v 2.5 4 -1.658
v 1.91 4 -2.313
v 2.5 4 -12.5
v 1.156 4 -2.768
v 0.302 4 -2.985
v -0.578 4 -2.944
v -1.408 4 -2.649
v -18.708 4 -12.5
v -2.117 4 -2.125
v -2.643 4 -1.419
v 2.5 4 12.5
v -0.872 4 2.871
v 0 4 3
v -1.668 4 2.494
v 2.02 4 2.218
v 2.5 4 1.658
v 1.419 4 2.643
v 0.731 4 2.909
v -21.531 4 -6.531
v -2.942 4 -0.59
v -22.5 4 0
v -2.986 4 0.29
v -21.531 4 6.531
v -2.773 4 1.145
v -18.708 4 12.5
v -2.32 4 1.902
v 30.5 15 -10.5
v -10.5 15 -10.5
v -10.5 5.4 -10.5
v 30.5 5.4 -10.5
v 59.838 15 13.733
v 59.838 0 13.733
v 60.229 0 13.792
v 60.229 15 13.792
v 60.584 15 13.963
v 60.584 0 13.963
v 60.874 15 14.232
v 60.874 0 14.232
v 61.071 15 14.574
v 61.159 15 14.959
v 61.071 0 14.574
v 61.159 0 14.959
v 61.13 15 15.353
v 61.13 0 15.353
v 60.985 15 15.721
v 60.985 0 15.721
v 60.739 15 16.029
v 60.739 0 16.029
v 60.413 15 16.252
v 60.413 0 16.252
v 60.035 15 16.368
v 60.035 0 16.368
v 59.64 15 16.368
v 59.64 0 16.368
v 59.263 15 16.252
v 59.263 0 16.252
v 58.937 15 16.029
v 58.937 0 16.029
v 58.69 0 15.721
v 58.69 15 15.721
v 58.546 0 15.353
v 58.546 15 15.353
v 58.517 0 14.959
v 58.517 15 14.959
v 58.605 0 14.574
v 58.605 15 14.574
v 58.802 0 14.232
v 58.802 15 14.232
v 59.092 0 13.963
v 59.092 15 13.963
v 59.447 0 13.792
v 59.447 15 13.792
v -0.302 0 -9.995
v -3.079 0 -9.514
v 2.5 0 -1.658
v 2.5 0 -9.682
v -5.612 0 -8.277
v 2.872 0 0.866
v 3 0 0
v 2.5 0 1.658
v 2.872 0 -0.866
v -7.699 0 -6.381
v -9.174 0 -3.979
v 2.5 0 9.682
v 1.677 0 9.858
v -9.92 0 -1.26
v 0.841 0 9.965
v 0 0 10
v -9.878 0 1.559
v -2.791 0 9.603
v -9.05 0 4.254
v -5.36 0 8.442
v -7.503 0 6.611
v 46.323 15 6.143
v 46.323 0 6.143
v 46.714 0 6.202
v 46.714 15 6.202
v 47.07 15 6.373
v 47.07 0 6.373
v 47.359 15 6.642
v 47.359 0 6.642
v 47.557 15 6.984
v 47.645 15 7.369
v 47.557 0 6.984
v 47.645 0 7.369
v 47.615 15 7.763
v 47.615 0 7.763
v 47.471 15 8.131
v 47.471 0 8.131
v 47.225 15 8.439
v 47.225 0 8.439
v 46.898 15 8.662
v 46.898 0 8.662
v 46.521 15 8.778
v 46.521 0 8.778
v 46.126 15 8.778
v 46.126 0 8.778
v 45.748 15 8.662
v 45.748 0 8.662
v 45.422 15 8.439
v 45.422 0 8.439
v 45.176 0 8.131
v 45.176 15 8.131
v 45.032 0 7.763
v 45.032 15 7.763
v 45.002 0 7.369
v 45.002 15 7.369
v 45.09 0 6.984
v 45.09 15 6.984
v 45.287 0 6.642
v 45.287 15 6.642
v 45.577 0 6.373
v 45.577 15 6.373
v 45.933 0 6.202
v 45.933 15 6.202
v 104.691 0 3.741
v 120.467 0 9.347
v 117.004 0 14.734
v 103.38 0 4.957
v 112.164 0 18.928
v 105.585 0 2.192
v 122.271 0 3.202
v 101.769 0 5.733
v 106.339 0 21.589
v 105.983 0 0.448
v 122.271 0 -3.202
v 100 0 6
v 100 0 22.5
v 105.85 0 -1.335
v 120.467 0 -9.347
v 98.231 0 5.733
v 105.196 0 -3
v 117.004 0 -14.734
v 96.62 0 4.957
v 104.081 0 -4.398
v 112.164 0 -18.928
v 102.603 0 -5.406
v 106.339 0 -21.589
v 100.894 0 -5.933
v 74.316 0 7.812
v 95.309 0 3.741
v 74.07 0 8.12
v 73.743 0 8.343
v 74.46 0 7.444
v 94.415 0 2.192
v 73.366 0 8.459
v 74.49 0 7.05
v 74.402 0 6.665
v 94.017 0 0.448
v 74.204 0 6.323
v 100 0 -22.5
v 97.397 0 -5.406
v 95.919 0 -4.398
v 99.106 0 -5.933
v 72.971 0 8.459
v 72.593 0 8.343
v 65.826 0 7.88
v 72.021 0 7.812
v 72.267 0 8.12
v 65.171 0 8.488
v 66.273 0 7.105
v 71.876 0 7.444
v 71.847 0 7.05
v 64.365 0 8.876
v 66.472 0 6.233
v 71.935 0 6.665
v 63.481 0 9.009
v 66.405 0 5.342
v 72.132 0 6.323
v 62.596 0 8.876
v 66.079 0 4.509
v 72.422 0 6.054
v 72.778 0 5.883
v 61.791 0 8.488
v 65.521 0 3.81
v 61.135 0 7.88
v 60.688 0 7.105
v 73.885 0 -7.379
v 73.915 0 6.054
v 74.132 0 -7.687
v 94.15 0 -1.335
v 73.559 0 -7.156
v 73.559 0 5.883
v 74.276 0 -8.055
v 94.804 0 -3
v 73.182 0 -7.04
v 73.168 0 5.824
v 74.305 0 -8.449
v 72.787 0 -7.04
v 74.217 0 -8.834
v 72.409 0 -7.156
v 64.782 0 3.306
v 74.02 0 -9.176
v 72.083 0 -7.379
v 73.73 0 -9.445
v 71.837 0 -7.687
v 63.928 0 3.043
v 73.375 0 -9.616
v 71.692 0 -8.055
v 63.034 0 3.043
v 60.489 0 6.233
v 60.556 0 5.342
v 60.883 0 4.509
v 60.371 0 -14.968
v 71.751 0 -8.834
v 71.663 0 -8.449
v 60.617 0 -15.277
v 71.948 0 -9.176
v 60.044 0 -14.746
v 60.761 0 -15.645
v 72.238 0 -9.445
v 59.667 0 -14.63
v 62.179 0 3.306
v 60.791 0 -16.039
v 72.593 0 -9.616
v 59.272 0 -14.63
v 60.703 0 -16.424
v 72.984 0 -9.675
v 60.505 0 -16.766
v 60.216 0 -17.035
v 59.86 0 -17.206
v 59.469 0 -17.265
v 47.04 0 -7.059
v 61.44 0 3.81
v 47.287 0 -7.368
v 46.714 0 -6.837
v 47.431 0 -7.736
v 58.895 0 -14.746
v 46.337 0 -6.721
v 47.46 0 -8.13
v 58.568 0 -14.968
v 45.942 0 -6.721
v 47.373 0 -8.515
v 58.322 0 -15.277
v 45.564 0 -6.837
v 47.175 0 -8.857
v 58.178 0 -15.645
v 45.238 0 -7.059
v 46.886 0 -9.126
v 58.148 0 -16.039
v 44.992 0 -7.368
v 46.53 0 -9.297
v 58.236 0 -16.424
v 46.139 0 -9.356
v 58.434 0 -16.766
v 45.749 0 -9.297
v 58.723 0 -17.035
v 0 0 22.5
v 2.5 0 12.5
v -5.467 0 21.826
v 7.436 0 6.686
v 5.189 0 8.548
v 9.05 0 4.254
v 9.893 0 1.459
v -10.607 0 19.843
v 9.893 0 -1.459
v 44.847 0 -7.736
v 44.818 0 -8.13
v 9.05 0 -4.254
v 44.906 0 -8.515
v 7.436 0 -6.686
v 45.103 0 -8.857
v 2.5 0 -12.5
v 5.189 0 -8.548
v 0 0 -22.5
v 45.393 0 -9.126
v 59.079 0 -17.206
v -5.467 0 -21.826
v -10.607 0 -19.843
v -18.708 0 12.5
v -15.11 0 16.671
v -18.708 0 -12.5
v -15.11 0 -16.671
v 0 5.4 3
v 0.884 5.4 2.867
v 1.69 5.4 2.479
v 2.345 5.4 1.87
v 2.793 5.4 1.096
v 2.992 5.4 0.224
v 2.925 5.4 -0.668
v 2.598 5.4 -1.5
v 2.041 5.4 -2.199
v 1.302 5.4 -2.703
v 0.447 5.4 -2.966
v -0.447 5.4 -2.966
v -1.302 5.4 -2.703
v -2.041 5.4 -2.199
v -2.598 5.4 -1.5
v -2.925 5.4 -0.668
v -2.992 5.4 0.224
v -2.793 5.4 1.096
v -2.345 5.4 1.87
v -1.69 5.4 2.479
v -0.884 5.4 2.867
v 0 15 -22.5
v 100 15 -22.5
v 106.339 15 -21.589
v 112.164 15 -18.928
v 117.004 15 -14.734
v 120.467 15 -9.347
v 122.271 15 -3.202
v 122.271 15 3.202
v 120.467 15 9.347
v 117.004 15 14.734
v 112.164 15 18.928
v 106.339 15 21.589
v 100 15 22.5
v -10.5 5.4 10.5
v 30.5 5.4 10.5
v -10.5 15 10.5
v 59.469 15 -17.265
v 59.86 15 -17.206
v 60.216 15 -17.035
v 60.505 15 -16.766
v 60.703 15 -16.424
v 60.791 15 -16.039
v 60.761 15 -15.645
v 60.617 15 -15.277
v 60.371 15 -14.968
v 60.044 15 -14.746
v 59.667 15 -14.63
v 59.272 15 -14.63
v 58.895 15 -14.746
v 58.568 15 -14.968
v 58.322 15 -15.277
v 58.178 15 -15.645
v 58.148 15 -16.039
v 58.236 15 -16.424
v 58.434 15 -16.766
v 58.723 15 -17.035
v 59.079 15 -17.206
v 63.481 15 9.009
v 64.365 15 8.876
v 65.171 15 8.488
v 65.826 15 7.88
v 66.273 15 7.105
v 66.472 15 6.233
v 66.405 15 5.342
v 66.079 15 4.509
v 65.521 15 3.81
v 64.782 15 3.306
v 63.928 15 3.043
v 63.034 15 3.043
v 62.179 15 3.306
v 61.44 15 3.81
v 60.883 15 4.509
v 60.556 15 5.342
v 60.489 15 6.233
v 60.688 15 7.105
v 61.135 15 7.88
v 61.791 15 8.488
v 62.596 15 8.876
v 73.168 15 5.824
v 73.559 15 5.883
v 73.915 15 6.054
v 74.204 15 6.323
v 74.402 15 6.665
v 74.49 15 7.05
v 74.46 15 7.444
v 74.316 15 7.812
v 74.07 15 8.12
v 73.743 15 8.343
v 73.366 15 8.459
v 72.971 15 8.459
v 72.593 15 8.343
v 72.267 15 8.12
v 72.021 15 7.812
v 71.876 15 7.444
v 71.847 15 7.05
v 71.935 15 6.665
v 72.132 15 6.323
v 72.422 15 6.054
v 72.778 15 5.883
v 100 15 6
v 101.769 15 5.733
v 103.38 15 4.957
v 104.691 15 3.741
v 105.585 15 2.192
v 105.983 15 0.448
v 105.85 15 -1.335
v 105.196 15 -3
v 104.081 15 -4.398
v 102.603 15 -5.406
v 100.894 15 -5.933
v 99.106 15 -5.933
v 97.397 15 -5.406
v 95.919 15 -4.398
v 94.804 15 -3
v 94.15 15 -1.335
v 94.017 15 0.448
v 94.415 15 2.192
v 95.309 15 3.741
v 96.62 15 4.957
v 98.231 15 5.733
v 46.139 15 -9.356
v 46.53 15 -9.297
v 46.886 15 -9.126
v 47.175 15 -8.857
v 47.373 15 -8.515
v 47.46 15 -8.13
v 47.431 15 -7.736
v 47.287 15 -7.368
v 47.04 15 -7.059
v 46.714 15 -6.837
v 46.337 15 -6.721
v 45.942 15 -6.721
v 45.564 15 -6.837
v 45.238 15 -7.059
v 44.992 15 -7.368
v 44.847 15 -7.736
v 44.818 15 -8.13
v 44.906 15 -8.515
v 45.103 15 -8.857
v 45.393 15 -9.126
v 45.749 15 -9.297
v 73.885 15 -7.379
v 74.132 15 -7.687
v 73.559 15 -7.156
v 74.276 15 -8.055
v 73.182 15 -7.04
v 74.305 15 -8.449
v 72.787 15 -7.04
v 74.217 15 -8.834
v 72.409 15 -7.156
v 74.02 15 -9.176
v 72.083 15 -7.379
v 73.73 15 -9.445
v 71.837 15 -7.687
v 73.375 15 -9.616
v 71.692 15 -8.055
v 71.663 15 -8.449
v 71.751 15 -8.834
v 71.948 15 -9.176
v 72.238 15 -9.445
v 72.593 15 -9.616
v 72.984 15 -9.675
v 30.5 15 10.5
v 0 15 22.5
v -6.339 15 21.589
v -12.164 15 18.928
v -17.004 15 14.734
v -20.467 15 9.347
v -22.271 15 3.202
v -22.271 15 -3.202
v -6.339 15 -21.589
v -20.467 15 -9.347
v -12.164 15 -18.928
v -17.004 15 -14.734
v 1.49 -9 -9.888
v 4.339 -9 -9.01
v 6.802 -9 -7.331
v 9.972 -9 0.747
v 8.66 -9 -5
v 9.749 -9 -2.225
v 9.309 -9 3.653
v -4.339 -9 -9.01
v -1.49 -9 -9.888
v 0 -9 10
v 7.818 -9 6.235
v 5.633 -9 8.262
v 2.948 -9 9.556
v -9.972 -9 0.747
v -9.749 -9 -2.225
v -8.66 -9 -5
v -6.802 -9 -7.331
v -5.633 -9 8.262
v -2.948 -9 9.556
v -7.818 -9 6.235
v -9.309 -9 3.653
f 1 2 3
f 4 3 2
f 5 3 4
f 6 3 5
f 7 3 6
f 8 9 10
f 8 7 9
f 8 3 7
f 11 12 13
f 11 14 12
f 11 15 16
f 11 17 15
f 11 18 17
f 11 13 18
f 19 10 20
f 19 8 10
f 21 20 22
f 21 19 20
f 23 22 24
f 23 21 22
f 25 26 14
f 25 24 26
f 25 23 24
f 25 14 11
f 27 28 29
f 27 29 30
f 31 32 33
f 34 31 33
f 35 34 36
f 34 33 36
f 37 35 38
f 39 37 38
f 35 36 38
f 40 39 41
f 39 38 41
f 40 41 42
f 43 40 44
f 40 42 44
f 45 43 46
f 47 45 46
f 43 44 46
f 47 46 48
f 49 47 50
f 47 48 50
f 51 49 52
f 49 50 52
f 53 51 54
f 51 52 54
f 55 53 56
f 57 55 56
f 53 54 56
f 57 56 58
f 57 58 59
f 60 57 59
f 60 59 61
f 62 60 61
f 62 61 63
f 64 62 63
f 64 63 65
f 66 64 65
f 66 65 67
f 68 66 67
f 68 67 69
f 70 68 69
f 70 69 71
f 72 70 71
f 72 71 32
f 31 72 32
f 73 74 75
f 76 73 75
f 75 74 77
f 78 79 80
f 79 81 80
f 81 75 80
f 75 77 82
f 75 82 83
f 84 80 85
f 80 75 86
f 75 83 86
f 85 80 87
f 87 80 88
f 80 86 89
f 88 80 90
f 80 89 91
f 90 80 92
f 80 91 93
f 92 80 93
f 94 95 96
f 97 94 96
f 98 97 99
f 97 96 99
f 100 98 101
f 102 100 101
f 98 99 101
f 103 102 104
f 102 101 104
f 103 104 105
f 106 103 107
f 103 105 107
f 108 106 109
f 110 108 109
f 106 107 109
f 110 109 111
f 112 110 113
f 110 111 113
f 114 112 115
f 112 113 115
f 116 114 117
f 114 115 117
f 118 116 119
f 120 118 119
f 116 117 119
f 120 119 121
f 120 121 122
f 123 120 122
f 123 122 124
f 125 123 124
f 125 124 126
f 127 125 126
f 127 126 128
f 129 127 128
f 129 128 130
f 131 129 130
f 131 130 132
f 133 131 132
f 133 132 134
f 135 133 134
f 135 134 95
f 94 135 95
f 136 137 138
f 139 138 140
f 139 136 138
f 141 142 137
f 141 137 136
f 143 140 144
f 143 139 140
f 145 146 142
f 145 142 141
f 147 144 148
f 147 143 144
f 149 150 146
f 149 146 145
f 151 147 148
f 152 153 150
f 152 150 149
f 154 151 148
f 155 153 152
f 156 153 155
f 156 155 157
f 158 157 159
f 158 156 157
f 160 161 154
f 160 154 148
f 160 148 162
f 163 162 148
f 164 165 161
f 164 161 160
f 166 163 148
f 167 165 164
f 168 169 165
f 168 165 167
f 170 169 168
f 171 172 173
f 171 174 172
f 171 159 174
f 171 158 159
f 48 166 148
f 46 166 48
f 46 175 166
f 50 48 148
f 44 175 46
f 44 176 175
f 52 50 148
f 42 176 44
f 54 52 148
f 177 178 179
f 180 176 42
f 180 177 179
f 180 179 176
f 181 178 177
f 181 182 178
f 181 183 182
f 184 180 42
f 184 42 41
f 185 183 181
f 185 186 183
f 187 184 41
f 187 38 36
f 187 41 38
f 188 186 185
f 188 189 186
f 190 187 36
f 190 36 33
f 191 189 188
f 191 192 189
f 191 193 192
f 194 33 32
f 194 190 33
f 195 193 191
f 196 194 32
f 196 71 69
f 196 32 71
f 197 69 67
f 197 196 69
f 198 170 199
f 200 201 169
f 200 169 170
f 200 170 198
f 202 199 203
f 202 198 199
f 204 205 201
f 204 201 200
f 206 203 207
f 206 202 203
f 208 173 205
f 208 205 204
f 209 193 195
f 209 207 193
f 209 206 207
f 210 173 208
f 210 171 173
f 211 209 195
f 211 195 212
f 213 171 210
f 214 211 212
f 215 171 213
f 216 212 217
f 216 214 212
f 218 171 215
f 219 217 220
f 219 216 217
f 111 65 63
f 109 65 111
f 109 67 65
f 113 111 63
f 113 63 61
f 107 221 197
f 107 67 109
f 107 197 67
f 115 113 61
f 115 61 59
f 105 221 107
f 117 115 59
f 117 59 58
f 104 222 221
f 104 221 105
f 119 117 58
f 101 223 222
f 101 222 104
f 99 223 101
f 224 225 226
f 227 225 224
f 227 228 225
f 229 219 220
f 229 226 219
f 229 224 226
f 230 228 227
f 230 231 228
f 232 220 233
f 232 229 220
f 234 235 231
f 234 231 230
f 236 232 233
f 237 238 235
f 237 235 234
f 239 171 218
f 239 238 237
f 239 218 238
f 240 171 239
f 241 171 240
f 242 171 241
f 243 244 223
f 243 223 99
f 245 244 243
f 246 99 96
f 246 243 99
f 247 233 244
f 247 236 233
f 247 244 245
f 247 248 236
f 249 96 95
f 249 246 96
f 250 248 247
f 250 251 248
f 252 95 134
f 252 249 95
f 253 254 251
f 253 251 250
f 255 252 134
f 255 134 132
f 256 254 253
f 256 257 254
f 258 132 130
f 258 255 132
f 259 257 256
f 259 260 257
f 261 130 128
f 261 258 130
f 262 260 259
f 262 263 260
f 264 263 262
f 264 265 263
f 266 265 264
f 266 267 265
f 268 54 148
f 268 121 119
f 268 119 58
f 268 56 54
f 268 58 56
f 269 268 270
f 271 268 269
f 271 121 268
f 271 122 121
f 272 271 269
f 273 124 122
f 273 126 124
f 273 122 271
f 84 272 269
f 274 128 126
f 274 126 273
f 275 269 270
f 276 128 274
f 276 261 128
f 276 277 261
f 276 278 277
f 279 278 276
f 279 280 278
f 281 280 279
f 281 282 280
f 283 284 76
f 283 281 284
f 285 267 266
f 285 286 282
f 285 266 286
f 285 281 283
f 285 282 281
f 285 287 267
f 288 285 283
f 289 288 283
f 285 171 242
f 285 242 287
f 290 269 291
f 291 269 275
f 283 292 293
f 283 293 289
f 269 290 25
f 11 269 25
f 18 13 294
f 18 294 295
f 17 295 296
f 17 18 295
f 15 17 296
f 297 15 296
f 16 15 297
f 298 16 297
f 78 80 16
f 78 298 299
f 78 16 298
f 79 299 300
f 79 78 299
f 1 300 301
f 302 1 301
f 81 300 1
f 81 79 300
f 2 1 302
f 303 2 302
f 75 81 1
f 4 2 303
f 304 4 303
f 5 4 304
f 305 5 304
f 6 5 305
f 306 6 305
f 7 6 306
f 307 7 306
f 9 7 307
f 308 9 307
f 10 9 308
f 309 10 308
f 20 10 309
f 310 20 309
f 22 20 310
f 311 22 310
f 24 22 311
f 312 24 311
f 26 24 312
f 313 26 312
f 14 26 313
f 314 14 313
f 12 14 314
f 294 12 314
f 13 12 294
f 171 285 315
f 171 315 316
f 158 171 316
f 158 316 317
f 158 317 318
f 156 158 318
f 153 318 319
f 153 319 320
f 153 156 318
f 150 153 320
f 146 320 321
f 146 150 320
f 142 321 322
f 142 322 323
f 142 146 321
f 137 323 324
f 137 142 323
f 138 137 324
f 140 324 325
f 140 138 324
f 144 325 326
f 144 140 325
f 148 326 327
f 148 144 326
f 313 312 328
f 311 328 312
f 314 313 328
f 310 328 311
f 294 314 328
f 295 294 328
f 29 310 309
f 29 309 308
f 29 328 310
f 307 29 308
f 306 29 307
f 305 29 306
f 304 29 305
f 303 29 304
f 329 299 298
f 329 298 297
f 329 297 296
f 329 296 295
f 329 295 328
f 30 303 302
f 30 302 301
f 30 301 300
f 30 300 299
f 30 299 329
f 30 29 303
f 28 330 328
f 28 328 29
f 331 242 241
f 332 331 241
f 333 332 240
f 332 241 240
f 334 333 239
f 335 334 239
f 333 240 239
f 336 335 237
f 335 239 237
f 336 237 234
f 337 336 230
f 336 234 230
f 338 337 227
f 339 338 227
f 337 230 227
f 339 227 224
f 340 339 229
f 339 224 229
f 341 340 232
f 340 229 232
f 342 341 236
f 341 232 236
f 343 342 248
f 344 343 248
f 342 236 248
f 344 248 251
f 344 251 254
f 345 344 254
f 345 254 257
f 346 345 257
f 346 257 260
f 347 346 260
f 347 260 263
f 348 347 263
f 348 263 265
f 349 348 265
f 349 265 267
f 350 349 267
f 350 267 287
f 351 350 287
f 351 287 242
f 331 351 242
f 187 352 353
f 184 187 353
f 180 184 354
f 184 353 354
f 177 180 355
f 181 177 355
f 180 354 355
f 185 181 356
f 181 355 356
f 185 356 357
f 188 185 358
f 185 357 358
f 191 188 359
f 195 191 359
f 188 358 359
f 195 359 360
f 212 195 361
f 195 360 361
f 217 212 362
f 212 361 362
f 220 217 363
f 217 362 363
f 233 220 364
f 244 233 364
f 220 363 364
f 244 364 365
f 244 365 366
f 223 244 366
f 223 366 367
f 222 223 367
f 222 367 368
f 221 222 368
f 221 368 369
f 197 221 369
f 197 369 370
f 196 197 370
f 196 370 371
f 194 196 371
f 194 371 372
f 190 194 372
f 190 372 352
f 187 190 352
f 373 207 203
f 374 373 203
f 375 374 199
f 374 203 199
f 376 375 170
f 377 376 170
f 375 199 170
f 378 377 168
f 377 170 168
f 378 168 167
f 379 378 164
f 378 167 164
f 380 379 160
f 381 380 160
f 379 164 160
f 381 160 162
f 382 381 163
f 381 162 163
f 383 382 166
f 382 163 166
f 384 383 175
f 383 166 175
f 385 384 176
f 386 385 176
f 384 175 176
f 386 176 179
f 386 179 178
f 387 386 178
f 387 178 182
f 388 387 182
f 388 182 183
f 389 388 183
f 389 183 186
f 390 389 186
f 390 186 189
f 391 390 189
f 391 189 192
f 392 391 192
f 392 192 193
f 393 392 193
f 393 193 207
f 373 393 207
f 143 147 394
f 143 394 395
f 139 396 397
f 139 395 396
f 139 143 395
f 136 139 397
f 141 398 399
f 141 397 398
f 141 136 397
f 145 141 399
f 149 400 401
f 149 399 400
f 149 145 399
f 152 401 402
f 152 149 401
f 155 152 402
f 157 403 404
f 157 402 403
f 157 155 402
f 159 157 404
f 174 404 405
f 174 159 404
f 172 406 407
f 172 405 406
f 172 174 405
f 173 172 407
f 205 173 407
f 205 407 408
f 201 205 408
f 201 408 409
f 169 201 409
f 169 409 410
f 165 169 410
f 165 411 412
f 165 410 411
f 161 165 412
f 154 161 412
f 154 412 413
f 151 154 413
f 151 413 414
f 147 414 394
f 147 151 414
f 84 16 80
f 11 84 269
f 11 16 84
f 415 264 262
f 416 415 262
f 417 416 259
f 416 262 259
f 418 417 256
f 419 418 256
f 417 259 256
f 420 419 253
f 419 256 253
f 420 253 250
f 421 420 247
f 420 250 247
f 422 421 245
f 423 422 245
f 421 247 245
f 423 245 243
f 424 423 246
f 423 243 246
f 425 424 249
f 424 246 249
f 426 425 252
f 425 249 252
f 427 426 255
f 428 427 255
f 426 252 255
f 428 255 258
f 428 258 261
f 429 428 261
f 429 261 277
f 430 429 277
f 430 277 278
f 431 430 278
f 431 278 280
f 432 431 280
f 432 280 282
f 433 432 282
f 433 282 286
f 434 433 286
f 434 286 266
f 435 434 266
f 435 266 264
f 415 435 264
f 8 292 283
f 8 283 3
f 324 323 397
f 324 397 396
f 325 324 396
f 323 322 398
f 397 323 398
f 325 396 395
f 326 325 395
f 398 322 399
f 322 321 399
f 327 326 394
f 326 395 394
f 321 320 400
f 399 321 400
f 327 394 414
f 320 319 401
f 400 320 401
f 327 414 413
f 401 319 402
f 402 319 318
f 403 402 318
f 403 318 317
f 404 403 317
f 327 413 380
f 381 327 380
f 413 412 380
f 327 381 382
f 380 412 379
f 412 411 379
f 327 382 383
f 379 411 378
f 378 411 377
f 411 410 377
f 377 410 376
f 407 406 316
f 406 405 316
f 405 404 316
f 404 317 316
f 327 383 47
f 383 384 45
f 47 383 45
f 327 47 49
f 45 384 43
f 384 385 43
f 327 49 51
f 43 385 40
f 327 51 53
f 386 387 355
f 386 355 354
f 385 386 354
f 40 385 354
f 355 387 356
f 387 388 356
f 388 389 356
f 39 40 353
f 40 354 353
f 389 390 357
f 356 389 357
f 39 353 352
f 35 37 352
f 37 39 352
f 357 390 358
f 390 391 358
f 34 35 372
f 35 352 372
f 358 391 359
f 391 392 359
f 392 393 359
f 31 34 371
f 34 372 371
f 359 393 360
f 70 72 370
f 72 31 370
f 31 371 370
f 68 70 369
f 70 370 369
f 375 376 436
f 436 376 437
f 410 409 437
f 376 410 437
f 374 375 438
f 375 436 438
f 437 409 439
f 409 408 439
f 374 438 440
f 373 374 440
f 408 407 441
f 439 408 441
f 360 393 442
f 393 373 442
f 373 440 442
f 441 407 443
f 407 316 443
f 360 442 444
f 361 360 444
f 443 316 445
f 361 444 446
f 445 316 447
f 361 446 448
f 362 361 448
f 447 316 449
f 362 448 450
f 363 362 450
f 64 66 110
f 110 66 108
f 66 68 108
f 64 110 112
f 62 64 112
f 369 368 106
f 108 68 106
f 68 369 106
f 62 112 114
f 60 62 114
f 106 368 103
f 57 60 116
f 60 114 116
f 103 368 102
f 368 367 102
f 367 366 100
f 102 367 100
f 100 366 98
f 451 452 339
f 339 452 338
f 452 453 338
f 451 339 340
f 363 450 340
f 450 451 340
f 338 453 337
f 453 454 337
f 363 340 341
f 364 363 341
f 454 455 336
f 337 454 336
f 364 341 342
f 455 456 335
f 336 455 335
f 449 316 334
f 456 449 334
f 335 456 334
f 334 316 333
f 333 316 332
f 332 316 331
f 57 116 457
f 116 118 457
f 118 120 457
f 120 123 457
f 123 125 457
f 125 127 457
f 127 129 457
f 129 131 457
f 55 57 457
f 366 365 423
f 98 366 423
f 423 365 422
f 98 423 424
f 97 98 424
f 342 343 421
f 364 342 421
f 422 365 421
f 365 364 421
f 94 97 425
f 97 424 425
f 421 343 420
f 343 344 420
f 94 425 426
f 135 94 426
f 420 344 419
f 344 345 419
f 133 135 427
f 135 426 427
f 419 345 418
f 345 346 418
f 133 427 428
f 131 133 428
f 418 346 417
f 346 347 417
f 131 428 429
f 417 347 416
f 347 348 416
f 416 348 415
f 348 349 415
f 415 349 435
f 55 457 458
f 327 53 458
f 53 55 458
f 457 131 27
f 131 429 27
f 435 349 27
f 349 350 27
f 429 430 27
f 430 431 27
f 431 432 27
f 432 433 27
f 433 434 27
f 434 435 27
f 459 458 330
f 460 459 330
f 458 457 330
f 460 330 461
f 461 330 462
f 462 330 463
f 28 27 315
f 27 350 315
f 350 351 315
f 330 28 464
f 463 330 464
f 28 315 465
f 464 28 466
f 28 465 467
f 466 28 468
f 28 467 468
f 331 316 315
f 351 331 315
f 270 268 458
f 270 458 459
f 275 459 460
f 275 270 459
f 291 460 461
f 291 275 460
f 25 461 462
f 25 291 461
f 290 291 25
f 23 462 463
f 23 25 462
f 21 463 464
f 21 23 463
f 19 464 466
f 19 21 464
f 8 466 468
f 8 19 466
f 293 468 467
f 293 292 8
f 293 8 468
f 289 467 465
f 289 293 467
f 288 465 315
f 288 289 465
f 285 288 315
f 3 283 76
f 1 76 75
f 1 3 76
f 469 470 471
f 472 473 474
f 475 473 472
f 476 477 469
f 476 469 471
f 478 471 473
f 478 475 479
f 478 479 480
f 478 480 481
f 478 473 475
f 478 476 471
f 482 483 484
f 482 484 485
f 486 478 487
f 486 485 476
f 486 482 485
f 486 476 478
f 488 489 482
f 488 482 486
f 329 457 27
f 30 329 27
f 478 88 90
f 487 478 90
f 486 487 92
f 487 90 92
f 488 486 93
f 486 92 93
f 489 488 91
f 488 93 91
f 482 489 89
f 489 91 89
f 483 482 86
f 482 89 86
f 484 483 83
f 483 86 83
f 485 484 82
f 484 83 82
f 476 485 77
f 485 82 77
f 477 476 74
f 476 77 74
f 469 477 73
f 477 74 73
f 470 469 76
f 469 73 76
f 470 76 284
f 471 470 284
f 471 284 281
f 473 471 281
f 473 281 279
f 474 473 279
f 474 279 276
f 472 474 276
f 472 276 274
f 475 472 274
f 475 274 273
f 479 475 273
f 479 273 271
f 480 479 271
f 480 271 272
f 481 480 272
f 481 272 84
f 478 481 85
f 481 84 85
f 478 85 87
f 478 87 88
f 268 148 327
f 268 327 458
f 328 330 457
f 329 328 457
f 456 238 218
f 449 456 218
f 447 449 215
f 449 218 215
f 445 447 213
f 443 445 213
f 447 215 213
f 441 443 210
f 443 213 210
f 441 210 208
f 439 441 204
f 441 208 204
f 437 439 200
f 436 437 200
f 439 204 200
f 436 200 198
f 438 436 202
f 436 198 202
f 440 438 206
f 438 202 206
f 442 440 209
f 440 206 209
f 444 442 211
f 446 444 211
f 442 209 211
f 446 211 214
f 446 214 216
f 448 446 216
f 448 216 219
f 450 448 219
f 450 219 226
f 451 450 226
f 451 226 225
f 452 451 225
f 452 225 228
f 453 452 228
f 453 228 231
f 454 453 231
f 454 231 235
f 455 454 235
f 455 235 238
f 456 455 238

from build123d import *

# Parameters (mm, degrees)
BOSS_EXTRUDE1_DEPTH     = 15
SKETCH2_R               = 10
BOSS_EXTRUDE2_DEPTH     = 9
CUT_EXTRUDE1_START      = -15
SKETCH3_R               = 3
CUT_EXTRUDE1_DEPTH      = 15
SKETCH4_W               = 41
SKETCH4_H               = 21
CUT_EXTRUDE2_DEPTH      = 9.6
SKETCH5_W               = 25
SKETCH5_H               = 4
CUT_EXTRUDE3_DEPTH      = 25
CUT_EXTRUDE4_DEPTH      = 127.840450961
CUT_EXTRUDE4_DEPTH_BACK = 127.840450961
SKETCH6_R               = 6
SKETCH7_R               = 3
CUT_EXTRUDE5_DEPTH      = 127.840450961
SKETCH8_R               = 1.325011821
CUT_EXTRUDE6_DEPTH      = 126.449192903


with BuildPart() as part:
    # Sketch1 → Boss-Extrude1 (new body)
    with BuildSketch(Plane(origin=(0, 0, 0), x_dir=(1, 0, 0), z_dir=(0, 1, 0))):
        with BuildLine():
            Line((0, 22.5), (100, 22.5))
            ThreePointArc((100, 22.5), (122.5, 0), (100, -22.5))
            Line((100, -22.5), (0, -22.5))
            ThreePointArc((0, -22.5), (-22.5, 0), (0, 22.5))
        make_face()
    extrude(amount=BOSS_EXTRUDE1_DEPTH)

    # Sketch2 → Boss-Extrude2 (add)
    with BuildSketch(Plane.XZ):
        with Locations(Location((0, 0, 0), (0, 0, 90))):
            Circle(SKETCH2_R)
    extrude(amount=BOSS_EXTRUDE2_DEPTH)

    # Sketch3 → Cut-Extrude1 (cut)
    with BuildSketch(Plane(origin=(0, 15, 0), x_dir=(1, 0, 0), z_dir=(0, 1, 0)).offset(CUT_EXTRUDE1_START)):
        with Locations(Location((0, 0, 0), (0, 0, 270))):
            Circle(SKETCH3_R)
    extrude(amount=CUT_EXTRUDE1_DEPTH, mode=Mode.SUBTRACT)

    # Sketch4 → Cut-Extrude2 (cut)
    with BuildSketch(Plane(origin=(0, 15, 0), x_dir=(1, 0, 0), z_dir=(0, 1, 0))):
        with Locations((10, 0)):
            Rectangle(SKETCH4_W, SKETCH4_H)
    extrude(amount=-CUT_EXTRUDE2_DEPTH, mode=Mode.SUBTRACT)

    # Sketch5 → Cut-Extrude3 (cut)
    with BuildSketch(Plane(origin=(-22.5, 15, 0), x_dir=(0, 0, 1), z_dir=(-1, 0, 0))):
        with Locations((0, -13)):
            Rectangle(SKETCH5_W, SKETCH5_H)
    extrude(amount=-CUT_EXTRUDE3_DEPTH, mode=Mode.SUBTRACT)

    # Sketch6 → Cut-Extrude4 (cut, two sides: drawn at the far end of the back side and taken through both)
    with BuildSketch(Plane(origin=(0, 15, 0), x_dir=(1, 0, 0), z_dir=(0, 1, 0)).offset(-CUT_EXTRUDE4_DEPTH_BACK)):
        with Locations(Location((100, 0, 0), (0, 0, 270))):
            Circle(SKETCH6_R)
    extrude(amount=CUT_EXTRUDE4_DEPTH + CUT_EXTRUDE4_DEPTH_BACK, mode=Mode.SUBTRACT)

    # Sketch7 → Cut-Extrude5 (cut, through all)
    with BuildSketch(Plane(origin=(0, 15, 0), x_dir=(1, 0, 0), z_dir=(0, 1, 0))):
        with Locations(Location((63.480653876, -6.00928668, 0), (0, 0, 270))):
            Circle(SKETCH7_R)
    extrude(amount=-CUT_EXTRUDE5_DEPTH, mode=Mode.SUBTRACT)

    # Sketch8 → Cut-Extrude6 (cut, through all)
    with BuildSketch(Plane.XZ):
        with Locations(Location((46.139135996, -8.030751211, 0), (0, 0, 270))):
            Circle(SKETCH8_R)
        with Locations(Location((46.323389896, 7.468153605, 0), (0, 0, 270))):
            Circle(SKETCH8_R)
        with Locations(Location((59.837962148, 15.058037455, 0), (0, 0, 270))):
            Circle(SKETCH8_R)
        with Locations(Location((73.168280499, 7.149016489, 0), (0, 0, 270))):
            Circle(SKETCH8_R)
        with Locations(Location((72.984026599, -8.349888327, 0), (0, 0, 270))):
            Circle(SKETCH8_R)
        with Locations(Location((59.469454347, -15.939772177, 0), (0, 0, 270))):
            Circle(SKETCH8_R)
    extrude(amount=-CUT_EXTRUDE6_DEPTH, mode=Mode.SUBTRACT)


solid = part.part
